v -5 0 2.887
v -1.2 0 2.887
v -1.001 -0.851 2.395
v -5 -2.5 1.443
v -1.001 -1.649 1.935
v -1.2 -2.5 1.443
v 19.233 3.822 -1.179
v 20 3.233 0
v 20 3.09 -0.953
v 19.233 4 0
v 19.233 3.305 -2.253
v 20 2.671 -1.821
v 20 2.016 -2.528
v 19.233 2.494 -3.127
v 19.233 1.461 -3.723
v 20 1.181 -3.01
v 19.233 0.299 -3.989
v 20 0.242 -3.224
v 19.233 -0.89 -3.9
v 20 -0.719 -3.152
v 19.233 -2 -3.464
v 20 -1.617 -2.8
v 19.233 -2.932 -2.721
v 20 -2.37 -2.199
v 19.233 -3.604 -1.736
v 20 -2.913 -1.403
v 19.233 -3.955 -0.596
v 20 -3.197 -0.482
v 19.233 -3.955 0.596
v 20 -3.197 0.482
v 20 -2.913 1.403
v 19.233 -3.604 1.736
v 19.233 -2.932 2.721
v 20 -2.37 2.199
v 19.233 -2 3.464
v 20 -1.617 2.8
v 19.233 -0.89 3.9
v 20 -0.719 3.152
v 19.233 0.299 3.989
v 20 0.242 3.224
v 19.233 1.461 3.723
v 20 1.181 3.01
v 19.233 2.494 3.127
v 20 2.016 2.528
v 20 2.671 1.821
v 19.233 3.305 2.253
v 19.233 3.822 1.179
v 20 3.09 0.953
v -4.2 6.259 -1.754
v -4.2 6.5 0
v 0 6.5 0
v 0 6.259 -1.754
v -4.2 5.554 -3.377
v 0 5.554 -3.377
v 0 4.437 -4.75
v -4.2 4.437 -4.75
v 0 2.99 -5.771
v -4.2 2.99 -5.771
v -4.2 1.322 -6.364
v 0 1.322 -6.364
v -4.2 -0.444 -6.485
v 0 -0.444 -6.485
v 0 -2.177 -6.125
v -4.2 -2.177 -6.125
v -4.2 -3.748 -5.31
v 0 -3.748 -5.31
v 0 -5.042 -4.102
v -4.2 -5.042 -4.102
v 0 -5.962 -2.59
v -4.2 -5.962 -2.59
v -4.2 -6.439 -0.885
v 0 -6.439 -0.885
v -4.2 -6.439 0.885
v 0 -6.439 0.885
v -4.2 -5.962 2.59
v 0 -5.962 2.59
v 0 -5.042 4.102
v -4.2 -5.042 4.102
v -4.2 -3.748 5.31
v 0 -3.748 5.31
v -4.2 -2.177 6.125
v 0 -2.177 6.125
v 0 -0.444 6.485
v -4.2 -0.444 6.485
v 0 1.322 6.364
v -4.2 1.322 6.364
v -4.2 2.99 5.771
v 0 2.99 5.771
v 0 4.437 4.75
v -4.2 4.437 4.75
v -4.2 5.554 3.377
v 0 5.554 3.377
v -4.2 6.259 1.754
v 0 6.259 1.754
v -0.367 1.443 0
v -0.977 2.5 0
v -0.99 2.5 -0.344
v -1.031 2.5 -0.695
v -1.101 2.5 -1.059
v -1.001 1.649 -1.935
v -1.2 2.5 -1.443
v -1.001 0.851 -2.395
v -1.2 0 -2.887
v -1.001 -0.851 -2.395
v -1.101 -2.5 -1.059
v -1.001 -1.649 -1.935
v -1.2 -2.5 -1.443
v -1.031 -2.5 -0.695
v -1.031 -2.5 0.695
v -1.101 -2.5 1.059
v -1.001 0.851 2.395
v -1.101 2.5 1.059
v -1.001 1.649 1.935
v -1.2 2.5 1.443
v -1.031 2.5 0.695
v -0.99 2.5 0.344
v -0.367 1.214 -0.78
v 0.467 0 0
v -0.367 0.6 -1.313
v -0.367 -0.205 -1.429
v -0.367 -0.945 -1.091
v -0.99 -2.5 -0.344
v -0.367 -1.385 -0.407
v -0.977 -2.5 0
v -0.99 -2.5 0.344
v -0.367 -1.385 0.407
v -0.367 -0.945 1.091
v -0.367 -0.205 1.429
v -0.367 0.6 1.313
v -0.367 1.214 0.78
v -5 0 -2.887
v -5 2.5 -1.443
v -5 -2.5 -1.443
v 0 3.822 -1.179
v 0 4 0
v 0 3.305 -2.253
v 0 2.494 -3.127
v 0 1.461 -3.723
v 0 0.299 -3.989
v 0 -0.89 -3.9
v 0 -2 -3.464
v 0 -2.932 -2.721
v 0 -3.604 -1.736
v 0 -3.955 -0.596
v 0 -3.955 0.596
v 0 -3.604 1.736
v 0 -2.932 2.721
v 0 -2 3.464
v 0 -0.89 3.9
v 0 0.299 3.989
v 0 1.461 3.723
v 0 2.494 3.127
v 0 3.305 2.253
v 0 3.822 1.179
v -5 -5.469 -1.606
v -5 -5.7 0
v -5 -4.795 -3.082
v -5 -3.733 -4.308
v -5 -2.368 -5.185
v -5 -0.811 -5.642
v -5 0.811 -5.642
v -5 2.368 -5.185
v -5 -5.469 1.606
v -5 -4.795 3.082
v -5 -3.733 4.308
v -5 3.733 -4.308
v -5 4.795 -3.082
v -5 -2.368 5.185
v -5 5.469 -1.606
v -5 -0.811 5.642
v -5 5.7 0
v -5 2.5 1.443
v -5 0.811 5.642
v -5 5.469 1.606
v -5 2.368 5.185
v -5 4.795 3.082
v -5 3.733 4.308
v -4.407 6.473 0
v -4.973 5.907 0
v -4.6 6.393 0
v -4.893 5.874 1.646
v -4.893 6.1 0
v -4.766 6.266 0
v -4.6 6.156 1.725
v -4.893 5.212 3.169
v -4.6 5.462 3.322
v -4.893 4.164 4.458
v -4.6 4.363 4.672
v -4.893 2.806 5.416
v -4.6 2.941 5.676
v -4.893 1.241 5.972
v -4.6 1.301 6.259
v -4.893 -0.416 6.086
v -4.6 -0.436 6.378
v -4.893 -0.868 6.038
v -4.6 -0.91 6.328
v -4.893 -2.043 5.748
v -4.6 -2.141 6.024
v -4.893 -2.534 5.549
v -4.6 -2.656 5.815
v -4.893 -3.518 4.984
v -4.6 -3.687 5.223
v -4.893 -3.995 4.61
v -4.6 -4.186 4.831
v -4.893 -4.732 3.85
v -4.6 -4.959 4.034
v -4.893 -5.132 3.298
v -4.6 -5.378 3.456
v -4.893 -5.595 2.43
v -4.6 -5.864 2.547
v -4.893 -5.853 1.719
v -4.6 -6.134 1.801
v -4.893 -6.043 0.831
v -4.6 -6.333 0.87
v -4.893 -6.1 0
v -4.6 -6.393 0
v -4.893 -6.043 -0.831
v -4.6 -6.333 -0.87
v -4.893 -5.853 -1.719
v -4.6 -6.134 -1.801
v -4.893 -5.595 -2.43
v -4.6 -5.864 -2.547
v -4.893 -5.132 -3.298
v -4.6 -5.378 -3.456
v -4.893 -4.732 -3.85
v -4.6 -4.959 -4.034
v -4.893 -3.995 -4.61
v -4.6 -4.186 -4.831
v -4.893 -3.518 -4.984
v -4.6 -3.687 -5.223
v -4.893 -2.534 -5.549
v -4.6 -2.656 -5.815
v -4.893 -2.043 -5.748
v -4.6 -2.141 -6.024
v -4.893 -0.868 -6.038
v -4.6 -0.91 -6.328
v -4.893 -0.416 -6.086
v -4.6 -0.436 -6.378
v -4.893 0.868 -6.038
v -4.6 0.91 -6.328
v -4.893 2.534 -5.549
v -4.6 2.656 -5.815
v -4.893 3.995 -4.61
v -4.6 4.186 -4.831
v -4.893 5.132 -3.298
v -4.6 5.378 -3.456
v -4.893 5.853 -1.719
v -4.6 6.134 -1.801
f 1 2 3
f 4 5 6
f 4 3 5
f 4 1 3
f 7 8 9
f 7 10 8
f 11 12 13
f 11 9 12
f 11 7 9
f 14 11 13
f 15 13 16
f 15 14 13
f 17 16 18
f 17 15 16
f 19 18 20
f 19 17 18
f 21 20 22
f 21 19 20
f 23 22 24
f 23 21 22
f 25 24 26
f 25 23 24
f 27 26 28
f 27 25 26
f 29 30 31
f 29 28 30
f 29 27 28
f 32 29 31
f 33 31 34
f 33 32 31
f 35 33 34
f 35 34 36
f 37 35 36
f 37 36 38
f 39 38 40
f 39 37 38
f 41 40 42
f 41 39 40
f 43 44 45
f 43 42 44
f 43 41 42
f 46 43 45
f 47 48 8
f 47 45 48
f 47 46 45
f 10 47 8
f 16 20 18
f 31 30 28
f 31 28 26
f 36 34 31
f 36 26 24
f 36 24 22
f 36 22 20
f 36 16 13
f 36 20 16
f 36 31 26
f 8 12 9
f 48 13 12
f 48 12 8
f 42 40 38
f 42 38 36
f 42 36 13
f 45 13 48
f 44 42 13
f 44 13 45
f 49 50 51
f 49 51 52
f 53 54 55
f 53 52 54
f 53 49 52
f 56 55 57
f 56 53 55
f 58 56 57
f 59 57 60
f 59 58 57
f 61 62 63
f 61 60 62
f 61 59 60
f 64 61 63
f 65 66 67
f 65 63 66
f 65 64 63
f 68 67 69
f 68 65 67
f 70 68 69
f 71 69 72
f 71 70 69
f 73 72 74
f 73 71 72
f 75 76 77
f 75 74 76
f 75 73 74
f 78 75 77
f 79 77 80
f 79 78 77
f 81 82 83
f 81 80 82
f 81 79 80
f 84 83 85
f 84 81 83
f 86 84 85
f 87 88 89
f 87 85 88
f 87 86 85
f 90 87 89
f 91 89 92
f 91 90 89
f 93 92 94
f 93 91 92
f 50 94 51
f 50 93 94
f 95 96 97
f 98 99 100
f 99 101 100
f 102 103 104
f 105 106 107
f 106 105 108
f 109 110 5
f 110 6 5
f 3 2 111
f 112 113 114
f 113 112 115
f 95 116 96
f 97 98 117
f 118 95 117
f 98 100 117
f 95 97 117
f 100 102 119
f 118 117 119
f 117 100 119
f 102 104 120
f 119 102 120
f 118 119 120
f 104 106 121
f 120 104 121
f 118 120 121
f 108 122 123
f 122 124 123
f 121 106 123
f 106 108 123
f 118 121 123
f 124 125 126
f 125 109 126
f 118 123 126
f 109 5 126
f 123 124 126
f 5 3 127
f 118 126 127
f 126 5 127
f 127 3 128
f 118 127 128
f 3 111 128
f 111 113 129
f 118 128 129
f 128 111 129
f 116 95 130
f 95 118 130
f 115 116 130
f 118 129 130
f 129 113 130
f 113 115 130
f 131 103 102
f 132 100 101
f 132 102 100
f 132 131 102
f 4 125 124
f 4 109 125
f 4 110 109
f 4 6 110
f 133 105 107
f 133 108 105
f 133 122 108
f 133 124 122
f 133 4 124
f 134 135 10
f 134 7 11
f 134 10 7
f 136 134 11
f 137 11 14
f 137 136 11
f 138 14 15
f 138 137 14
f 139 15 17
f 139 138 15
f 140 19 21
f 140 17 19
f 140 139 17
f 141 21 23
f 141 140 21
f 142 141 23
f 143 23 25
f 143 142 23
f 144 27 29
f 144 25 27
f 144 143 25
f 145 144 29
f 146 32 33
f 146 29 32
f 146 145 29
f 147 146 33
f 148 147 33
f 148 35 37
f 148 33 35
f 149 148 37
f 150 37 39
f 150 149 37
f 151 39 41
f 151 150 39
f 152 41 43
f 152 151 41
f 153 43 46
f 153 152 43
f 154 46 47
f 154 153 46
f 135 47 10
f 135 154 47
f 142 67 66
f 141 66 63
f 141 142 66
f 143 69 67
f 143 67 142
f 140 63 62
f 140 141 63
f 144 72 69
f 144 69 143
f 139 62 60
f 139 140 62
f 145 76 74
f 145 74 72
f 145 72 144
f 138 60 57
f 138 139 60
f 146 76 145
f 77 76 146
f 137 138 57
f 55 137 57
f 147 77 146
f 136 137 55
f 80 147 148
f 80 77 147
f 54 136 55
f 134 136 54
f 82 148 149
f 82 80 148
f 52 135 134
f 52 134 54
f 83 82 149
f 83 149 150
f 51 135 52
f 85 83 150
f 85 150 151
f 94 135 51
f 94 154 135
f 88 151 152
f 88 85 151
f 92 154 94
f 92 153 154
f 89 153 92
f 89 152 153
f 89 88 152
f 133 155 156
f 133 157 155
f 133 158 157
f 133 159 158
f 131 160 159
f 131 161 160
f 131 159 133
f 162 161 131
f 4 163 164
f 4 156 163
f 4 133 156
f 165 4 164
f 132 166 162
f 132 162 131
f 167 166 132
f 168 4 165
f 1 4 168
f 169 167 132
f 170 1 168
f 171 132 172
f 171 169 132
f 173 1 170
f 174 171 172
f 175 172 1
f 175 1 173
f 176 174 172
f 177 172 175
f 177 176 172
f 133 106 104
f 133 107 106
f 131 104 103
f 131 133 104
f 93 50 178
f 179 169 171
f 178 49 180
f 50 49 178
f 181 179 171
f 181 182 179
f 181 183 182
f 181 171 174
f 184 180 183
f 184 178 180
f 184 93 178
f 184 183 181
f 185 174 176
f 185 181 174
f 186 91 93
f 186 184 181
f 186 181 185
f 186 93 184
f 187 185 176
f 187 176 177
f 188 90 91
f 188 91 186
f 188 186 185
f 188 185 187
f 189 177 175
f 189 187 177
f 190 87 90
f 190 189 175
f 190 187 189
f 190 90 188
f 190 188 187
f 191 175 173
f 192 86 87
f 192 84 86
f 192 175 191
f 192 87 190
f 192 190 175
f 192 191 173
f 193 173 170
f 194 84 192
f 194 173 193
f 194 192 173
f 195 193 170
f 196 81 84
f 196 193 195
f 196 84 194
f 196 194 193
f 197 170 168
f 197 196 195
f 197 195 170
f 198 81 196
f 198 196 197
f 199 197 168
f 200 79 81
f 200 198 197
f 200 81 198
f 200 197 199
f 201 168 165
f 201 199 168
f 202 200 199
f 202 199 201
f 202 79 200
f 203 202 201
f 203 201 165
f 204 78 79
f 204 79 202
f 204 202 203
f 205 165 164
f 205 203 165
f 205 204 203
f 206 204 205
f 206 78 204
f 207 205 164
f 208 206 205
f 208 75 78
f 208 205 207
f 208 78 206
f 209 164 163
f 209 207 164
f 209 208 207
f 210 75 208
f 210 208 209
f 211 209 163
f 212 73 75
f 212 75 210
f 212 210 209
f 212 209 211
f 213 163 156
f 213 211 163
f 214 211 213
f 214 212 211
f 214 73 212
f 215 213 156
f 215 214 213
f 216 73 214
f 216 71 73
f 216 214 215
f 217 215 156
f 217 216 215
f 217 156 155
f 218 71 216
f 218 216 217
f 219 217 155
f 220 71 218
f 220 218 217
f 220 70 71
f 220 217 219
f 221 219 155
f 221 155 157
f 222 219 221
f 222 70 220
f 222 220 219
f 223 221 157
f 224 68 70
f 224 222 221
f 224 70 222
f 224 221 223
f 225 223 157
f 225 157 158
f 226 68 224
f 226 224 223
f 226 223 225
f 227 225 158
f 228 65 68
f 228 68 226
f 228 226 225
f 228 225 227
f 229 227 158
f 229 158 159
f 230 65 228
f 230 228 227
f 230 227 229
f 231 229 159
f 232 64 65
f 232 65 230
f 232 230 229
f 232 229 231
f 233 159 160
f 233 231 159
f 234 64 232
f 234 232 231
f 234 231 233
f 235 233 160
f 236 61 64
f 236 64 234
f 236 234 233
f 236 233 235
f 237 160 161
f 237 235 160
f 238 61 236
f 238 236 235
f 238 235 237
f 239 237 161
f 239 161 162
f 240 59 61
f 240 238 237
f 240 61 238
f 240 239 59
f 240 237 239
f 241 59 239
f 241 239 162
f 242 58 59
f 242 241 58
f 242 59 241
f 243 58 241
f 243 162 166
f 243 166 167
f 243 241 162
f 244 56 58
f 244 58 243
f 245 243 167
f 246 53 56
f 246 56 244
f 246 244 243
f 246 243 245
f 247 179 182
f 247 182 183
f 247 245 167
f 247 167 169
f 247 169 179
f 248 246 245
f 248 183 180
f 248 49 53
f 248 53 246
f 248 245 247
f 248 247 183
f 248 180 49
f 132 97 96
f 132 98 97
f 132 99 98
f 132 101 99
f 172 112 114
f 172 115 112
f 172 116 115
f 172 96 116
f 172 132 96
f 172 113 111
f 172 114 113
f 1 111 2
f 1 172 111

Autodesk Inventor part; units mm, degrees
ref_plane "YZ Plane" through (0, 0, 0) normal (1, 0, 0) x (0, 1, 0)
ref_plane "XZ Plane" through (0, 0, 0) normal (0, 1, 0) x (-1, 0, 0)
sketch "Sketch1" plane through (0, 0, 0) normal (0, 0, 1) x (1, 0, 0)
  line L0 (0.4667, 0) -> (20, 0)
  line L1 (20, 0) -> (20, 4)
  line L2 (20, 4) -> (1, 4)
  line L3 (1, 4) -> (0.2331, 4)
  line L4 (0.2331, 4) -> (0, 4)
  line L5 (0, 4) -> (0, 6.5)
  line L6 (0, 6.5) -> (-5, 6.5)
  line L7 (-5, 6.5) -> (-5, 2.8868)
  line L8 (-5, 2.8868) -> (-1.2, 2.8868)
  line L9 (-1.2, 2.8868) -> (0.4667, 0)
  line L10 (-7.5, 0) -> (27.5, 0) projected
  line L11 (0, -0.65) -> (0, 8.45) projected
  line L12 (1, 4) -> (0, 4) construction
  dimension "d1" = 19
  dimension "d2" = 0.7669
  dimension "d3" = 5
  dimension "d4" = 3.8
  dimension "d5" = 60
  dimension "d6" = 8
  dimension "d7" = 8
  dimension "d8" = 5.7735
  dimension "d9" = 13
  dimension "d26" = 20
revolve "Body" add sketch "Sketch1" angle 360 about axis through (0.4667, 0, 0) along (1, 0, 0) contours L9 L11 L4 L3 L2 L1 L0 | L9 L8 L7 L6 L5 L11
sketch "Sketch2" plane through (-5, 0, 0) normal (-1, 0, 0) x (0, 0, 1)
  circle A0 centre (0, 0) radius 2.8868 projected
  line L0 (0, -7.8) -> (0, 10.4) projected
  line L1 (-7.8, 0) -> (10.4, 0) projected
  line L2 (2.8868, 0) -> (1.4434, -2.5)
  line L3 (1.4434, -2.5) -> (-1.4434, -2.5)
  line L4 (-1.4434, -2.5) -> (-2.8868, 0)
  line L5 (-2.8868, 0) -> (-1.4434, 2.5)
  line L6 (-1.4434, 2.5) -> (1.4434, 2.5)
  line L7 (1.4434, 2.5) -> (2.8868, 0)
  point P0 (0, 0)
extrude "Slot" add sketch "Sketch2" against normal up to next contours L7 A0 | A0 L2 | L6 L0 A0 | A0 L0 L3 | L0 L6 A0 | A0 L3 L0 | L4 A0 | A0 L5
fillet "Fillet1" radius 0.8 1 edges at (-5, -6.5, 0)
thread "Thread" size "M8x1.25" class "6g" standard "ISO Metric profile" length 20
chamfer "Chamfer1" distance 0.7668 distance2 0.7668 1 edges at (20, -4, 0) measured on face at (20, -0.0467, 2.2623)
ref_plane "Work Plane1" through (29, 0, 0) normal (0, -1, 0) x (1, 0, 0)
equation "\"d17\" = RR"
equation "\"d15\" = -0.5 * SPD + 0.5 * GD"
equation "\"d16\" = GUL"
equation "\"d1\" = GEL"
equation "\"d3\" = KOH"
equation "\"d4\" = INTI"
equation "\"d6\" = GD"
equation "\"d7\" = BDM"
equation "\"d8\" = 1.1547 * SW"
equation "\"d9\" = KOD"
equation "\"d26\" = NLG"
equation "\"GD\" = NND"
equation "\"NLG\" = 20"
equation "\"GEL\" = 19"
equation "\"KOD\" = 13"
equation "\"KOH\" = 5"
equation "\"INTI\" = 3.8"
equation "\"GAL\" = 0.61345 * PTC"
equation "\"GUL\" = 0.61345 * PTC"
equation "\"BDM\" = NND"
equation "\"SW\" = 5"
equation "\"RR\" = 0.8"
equation "\"SPD\" = NND - 1.2269 * PTC"
equation "\"TOA\" = 30deg"
equation "\"GD1\" = THREADDIA - 1.2269 * PTC"
equation "\"THREADDIA\" = 8"
equation "\"FAWI\" = 45deg"
equation "\"ANG\" = 120deg"
equation "\"PTC\" = 1.25"
equation "\"NND\" = 8"
equation "\"E0\" = 1.155 * SW"
properties part number "21.1202" material "Steel, Mild"
